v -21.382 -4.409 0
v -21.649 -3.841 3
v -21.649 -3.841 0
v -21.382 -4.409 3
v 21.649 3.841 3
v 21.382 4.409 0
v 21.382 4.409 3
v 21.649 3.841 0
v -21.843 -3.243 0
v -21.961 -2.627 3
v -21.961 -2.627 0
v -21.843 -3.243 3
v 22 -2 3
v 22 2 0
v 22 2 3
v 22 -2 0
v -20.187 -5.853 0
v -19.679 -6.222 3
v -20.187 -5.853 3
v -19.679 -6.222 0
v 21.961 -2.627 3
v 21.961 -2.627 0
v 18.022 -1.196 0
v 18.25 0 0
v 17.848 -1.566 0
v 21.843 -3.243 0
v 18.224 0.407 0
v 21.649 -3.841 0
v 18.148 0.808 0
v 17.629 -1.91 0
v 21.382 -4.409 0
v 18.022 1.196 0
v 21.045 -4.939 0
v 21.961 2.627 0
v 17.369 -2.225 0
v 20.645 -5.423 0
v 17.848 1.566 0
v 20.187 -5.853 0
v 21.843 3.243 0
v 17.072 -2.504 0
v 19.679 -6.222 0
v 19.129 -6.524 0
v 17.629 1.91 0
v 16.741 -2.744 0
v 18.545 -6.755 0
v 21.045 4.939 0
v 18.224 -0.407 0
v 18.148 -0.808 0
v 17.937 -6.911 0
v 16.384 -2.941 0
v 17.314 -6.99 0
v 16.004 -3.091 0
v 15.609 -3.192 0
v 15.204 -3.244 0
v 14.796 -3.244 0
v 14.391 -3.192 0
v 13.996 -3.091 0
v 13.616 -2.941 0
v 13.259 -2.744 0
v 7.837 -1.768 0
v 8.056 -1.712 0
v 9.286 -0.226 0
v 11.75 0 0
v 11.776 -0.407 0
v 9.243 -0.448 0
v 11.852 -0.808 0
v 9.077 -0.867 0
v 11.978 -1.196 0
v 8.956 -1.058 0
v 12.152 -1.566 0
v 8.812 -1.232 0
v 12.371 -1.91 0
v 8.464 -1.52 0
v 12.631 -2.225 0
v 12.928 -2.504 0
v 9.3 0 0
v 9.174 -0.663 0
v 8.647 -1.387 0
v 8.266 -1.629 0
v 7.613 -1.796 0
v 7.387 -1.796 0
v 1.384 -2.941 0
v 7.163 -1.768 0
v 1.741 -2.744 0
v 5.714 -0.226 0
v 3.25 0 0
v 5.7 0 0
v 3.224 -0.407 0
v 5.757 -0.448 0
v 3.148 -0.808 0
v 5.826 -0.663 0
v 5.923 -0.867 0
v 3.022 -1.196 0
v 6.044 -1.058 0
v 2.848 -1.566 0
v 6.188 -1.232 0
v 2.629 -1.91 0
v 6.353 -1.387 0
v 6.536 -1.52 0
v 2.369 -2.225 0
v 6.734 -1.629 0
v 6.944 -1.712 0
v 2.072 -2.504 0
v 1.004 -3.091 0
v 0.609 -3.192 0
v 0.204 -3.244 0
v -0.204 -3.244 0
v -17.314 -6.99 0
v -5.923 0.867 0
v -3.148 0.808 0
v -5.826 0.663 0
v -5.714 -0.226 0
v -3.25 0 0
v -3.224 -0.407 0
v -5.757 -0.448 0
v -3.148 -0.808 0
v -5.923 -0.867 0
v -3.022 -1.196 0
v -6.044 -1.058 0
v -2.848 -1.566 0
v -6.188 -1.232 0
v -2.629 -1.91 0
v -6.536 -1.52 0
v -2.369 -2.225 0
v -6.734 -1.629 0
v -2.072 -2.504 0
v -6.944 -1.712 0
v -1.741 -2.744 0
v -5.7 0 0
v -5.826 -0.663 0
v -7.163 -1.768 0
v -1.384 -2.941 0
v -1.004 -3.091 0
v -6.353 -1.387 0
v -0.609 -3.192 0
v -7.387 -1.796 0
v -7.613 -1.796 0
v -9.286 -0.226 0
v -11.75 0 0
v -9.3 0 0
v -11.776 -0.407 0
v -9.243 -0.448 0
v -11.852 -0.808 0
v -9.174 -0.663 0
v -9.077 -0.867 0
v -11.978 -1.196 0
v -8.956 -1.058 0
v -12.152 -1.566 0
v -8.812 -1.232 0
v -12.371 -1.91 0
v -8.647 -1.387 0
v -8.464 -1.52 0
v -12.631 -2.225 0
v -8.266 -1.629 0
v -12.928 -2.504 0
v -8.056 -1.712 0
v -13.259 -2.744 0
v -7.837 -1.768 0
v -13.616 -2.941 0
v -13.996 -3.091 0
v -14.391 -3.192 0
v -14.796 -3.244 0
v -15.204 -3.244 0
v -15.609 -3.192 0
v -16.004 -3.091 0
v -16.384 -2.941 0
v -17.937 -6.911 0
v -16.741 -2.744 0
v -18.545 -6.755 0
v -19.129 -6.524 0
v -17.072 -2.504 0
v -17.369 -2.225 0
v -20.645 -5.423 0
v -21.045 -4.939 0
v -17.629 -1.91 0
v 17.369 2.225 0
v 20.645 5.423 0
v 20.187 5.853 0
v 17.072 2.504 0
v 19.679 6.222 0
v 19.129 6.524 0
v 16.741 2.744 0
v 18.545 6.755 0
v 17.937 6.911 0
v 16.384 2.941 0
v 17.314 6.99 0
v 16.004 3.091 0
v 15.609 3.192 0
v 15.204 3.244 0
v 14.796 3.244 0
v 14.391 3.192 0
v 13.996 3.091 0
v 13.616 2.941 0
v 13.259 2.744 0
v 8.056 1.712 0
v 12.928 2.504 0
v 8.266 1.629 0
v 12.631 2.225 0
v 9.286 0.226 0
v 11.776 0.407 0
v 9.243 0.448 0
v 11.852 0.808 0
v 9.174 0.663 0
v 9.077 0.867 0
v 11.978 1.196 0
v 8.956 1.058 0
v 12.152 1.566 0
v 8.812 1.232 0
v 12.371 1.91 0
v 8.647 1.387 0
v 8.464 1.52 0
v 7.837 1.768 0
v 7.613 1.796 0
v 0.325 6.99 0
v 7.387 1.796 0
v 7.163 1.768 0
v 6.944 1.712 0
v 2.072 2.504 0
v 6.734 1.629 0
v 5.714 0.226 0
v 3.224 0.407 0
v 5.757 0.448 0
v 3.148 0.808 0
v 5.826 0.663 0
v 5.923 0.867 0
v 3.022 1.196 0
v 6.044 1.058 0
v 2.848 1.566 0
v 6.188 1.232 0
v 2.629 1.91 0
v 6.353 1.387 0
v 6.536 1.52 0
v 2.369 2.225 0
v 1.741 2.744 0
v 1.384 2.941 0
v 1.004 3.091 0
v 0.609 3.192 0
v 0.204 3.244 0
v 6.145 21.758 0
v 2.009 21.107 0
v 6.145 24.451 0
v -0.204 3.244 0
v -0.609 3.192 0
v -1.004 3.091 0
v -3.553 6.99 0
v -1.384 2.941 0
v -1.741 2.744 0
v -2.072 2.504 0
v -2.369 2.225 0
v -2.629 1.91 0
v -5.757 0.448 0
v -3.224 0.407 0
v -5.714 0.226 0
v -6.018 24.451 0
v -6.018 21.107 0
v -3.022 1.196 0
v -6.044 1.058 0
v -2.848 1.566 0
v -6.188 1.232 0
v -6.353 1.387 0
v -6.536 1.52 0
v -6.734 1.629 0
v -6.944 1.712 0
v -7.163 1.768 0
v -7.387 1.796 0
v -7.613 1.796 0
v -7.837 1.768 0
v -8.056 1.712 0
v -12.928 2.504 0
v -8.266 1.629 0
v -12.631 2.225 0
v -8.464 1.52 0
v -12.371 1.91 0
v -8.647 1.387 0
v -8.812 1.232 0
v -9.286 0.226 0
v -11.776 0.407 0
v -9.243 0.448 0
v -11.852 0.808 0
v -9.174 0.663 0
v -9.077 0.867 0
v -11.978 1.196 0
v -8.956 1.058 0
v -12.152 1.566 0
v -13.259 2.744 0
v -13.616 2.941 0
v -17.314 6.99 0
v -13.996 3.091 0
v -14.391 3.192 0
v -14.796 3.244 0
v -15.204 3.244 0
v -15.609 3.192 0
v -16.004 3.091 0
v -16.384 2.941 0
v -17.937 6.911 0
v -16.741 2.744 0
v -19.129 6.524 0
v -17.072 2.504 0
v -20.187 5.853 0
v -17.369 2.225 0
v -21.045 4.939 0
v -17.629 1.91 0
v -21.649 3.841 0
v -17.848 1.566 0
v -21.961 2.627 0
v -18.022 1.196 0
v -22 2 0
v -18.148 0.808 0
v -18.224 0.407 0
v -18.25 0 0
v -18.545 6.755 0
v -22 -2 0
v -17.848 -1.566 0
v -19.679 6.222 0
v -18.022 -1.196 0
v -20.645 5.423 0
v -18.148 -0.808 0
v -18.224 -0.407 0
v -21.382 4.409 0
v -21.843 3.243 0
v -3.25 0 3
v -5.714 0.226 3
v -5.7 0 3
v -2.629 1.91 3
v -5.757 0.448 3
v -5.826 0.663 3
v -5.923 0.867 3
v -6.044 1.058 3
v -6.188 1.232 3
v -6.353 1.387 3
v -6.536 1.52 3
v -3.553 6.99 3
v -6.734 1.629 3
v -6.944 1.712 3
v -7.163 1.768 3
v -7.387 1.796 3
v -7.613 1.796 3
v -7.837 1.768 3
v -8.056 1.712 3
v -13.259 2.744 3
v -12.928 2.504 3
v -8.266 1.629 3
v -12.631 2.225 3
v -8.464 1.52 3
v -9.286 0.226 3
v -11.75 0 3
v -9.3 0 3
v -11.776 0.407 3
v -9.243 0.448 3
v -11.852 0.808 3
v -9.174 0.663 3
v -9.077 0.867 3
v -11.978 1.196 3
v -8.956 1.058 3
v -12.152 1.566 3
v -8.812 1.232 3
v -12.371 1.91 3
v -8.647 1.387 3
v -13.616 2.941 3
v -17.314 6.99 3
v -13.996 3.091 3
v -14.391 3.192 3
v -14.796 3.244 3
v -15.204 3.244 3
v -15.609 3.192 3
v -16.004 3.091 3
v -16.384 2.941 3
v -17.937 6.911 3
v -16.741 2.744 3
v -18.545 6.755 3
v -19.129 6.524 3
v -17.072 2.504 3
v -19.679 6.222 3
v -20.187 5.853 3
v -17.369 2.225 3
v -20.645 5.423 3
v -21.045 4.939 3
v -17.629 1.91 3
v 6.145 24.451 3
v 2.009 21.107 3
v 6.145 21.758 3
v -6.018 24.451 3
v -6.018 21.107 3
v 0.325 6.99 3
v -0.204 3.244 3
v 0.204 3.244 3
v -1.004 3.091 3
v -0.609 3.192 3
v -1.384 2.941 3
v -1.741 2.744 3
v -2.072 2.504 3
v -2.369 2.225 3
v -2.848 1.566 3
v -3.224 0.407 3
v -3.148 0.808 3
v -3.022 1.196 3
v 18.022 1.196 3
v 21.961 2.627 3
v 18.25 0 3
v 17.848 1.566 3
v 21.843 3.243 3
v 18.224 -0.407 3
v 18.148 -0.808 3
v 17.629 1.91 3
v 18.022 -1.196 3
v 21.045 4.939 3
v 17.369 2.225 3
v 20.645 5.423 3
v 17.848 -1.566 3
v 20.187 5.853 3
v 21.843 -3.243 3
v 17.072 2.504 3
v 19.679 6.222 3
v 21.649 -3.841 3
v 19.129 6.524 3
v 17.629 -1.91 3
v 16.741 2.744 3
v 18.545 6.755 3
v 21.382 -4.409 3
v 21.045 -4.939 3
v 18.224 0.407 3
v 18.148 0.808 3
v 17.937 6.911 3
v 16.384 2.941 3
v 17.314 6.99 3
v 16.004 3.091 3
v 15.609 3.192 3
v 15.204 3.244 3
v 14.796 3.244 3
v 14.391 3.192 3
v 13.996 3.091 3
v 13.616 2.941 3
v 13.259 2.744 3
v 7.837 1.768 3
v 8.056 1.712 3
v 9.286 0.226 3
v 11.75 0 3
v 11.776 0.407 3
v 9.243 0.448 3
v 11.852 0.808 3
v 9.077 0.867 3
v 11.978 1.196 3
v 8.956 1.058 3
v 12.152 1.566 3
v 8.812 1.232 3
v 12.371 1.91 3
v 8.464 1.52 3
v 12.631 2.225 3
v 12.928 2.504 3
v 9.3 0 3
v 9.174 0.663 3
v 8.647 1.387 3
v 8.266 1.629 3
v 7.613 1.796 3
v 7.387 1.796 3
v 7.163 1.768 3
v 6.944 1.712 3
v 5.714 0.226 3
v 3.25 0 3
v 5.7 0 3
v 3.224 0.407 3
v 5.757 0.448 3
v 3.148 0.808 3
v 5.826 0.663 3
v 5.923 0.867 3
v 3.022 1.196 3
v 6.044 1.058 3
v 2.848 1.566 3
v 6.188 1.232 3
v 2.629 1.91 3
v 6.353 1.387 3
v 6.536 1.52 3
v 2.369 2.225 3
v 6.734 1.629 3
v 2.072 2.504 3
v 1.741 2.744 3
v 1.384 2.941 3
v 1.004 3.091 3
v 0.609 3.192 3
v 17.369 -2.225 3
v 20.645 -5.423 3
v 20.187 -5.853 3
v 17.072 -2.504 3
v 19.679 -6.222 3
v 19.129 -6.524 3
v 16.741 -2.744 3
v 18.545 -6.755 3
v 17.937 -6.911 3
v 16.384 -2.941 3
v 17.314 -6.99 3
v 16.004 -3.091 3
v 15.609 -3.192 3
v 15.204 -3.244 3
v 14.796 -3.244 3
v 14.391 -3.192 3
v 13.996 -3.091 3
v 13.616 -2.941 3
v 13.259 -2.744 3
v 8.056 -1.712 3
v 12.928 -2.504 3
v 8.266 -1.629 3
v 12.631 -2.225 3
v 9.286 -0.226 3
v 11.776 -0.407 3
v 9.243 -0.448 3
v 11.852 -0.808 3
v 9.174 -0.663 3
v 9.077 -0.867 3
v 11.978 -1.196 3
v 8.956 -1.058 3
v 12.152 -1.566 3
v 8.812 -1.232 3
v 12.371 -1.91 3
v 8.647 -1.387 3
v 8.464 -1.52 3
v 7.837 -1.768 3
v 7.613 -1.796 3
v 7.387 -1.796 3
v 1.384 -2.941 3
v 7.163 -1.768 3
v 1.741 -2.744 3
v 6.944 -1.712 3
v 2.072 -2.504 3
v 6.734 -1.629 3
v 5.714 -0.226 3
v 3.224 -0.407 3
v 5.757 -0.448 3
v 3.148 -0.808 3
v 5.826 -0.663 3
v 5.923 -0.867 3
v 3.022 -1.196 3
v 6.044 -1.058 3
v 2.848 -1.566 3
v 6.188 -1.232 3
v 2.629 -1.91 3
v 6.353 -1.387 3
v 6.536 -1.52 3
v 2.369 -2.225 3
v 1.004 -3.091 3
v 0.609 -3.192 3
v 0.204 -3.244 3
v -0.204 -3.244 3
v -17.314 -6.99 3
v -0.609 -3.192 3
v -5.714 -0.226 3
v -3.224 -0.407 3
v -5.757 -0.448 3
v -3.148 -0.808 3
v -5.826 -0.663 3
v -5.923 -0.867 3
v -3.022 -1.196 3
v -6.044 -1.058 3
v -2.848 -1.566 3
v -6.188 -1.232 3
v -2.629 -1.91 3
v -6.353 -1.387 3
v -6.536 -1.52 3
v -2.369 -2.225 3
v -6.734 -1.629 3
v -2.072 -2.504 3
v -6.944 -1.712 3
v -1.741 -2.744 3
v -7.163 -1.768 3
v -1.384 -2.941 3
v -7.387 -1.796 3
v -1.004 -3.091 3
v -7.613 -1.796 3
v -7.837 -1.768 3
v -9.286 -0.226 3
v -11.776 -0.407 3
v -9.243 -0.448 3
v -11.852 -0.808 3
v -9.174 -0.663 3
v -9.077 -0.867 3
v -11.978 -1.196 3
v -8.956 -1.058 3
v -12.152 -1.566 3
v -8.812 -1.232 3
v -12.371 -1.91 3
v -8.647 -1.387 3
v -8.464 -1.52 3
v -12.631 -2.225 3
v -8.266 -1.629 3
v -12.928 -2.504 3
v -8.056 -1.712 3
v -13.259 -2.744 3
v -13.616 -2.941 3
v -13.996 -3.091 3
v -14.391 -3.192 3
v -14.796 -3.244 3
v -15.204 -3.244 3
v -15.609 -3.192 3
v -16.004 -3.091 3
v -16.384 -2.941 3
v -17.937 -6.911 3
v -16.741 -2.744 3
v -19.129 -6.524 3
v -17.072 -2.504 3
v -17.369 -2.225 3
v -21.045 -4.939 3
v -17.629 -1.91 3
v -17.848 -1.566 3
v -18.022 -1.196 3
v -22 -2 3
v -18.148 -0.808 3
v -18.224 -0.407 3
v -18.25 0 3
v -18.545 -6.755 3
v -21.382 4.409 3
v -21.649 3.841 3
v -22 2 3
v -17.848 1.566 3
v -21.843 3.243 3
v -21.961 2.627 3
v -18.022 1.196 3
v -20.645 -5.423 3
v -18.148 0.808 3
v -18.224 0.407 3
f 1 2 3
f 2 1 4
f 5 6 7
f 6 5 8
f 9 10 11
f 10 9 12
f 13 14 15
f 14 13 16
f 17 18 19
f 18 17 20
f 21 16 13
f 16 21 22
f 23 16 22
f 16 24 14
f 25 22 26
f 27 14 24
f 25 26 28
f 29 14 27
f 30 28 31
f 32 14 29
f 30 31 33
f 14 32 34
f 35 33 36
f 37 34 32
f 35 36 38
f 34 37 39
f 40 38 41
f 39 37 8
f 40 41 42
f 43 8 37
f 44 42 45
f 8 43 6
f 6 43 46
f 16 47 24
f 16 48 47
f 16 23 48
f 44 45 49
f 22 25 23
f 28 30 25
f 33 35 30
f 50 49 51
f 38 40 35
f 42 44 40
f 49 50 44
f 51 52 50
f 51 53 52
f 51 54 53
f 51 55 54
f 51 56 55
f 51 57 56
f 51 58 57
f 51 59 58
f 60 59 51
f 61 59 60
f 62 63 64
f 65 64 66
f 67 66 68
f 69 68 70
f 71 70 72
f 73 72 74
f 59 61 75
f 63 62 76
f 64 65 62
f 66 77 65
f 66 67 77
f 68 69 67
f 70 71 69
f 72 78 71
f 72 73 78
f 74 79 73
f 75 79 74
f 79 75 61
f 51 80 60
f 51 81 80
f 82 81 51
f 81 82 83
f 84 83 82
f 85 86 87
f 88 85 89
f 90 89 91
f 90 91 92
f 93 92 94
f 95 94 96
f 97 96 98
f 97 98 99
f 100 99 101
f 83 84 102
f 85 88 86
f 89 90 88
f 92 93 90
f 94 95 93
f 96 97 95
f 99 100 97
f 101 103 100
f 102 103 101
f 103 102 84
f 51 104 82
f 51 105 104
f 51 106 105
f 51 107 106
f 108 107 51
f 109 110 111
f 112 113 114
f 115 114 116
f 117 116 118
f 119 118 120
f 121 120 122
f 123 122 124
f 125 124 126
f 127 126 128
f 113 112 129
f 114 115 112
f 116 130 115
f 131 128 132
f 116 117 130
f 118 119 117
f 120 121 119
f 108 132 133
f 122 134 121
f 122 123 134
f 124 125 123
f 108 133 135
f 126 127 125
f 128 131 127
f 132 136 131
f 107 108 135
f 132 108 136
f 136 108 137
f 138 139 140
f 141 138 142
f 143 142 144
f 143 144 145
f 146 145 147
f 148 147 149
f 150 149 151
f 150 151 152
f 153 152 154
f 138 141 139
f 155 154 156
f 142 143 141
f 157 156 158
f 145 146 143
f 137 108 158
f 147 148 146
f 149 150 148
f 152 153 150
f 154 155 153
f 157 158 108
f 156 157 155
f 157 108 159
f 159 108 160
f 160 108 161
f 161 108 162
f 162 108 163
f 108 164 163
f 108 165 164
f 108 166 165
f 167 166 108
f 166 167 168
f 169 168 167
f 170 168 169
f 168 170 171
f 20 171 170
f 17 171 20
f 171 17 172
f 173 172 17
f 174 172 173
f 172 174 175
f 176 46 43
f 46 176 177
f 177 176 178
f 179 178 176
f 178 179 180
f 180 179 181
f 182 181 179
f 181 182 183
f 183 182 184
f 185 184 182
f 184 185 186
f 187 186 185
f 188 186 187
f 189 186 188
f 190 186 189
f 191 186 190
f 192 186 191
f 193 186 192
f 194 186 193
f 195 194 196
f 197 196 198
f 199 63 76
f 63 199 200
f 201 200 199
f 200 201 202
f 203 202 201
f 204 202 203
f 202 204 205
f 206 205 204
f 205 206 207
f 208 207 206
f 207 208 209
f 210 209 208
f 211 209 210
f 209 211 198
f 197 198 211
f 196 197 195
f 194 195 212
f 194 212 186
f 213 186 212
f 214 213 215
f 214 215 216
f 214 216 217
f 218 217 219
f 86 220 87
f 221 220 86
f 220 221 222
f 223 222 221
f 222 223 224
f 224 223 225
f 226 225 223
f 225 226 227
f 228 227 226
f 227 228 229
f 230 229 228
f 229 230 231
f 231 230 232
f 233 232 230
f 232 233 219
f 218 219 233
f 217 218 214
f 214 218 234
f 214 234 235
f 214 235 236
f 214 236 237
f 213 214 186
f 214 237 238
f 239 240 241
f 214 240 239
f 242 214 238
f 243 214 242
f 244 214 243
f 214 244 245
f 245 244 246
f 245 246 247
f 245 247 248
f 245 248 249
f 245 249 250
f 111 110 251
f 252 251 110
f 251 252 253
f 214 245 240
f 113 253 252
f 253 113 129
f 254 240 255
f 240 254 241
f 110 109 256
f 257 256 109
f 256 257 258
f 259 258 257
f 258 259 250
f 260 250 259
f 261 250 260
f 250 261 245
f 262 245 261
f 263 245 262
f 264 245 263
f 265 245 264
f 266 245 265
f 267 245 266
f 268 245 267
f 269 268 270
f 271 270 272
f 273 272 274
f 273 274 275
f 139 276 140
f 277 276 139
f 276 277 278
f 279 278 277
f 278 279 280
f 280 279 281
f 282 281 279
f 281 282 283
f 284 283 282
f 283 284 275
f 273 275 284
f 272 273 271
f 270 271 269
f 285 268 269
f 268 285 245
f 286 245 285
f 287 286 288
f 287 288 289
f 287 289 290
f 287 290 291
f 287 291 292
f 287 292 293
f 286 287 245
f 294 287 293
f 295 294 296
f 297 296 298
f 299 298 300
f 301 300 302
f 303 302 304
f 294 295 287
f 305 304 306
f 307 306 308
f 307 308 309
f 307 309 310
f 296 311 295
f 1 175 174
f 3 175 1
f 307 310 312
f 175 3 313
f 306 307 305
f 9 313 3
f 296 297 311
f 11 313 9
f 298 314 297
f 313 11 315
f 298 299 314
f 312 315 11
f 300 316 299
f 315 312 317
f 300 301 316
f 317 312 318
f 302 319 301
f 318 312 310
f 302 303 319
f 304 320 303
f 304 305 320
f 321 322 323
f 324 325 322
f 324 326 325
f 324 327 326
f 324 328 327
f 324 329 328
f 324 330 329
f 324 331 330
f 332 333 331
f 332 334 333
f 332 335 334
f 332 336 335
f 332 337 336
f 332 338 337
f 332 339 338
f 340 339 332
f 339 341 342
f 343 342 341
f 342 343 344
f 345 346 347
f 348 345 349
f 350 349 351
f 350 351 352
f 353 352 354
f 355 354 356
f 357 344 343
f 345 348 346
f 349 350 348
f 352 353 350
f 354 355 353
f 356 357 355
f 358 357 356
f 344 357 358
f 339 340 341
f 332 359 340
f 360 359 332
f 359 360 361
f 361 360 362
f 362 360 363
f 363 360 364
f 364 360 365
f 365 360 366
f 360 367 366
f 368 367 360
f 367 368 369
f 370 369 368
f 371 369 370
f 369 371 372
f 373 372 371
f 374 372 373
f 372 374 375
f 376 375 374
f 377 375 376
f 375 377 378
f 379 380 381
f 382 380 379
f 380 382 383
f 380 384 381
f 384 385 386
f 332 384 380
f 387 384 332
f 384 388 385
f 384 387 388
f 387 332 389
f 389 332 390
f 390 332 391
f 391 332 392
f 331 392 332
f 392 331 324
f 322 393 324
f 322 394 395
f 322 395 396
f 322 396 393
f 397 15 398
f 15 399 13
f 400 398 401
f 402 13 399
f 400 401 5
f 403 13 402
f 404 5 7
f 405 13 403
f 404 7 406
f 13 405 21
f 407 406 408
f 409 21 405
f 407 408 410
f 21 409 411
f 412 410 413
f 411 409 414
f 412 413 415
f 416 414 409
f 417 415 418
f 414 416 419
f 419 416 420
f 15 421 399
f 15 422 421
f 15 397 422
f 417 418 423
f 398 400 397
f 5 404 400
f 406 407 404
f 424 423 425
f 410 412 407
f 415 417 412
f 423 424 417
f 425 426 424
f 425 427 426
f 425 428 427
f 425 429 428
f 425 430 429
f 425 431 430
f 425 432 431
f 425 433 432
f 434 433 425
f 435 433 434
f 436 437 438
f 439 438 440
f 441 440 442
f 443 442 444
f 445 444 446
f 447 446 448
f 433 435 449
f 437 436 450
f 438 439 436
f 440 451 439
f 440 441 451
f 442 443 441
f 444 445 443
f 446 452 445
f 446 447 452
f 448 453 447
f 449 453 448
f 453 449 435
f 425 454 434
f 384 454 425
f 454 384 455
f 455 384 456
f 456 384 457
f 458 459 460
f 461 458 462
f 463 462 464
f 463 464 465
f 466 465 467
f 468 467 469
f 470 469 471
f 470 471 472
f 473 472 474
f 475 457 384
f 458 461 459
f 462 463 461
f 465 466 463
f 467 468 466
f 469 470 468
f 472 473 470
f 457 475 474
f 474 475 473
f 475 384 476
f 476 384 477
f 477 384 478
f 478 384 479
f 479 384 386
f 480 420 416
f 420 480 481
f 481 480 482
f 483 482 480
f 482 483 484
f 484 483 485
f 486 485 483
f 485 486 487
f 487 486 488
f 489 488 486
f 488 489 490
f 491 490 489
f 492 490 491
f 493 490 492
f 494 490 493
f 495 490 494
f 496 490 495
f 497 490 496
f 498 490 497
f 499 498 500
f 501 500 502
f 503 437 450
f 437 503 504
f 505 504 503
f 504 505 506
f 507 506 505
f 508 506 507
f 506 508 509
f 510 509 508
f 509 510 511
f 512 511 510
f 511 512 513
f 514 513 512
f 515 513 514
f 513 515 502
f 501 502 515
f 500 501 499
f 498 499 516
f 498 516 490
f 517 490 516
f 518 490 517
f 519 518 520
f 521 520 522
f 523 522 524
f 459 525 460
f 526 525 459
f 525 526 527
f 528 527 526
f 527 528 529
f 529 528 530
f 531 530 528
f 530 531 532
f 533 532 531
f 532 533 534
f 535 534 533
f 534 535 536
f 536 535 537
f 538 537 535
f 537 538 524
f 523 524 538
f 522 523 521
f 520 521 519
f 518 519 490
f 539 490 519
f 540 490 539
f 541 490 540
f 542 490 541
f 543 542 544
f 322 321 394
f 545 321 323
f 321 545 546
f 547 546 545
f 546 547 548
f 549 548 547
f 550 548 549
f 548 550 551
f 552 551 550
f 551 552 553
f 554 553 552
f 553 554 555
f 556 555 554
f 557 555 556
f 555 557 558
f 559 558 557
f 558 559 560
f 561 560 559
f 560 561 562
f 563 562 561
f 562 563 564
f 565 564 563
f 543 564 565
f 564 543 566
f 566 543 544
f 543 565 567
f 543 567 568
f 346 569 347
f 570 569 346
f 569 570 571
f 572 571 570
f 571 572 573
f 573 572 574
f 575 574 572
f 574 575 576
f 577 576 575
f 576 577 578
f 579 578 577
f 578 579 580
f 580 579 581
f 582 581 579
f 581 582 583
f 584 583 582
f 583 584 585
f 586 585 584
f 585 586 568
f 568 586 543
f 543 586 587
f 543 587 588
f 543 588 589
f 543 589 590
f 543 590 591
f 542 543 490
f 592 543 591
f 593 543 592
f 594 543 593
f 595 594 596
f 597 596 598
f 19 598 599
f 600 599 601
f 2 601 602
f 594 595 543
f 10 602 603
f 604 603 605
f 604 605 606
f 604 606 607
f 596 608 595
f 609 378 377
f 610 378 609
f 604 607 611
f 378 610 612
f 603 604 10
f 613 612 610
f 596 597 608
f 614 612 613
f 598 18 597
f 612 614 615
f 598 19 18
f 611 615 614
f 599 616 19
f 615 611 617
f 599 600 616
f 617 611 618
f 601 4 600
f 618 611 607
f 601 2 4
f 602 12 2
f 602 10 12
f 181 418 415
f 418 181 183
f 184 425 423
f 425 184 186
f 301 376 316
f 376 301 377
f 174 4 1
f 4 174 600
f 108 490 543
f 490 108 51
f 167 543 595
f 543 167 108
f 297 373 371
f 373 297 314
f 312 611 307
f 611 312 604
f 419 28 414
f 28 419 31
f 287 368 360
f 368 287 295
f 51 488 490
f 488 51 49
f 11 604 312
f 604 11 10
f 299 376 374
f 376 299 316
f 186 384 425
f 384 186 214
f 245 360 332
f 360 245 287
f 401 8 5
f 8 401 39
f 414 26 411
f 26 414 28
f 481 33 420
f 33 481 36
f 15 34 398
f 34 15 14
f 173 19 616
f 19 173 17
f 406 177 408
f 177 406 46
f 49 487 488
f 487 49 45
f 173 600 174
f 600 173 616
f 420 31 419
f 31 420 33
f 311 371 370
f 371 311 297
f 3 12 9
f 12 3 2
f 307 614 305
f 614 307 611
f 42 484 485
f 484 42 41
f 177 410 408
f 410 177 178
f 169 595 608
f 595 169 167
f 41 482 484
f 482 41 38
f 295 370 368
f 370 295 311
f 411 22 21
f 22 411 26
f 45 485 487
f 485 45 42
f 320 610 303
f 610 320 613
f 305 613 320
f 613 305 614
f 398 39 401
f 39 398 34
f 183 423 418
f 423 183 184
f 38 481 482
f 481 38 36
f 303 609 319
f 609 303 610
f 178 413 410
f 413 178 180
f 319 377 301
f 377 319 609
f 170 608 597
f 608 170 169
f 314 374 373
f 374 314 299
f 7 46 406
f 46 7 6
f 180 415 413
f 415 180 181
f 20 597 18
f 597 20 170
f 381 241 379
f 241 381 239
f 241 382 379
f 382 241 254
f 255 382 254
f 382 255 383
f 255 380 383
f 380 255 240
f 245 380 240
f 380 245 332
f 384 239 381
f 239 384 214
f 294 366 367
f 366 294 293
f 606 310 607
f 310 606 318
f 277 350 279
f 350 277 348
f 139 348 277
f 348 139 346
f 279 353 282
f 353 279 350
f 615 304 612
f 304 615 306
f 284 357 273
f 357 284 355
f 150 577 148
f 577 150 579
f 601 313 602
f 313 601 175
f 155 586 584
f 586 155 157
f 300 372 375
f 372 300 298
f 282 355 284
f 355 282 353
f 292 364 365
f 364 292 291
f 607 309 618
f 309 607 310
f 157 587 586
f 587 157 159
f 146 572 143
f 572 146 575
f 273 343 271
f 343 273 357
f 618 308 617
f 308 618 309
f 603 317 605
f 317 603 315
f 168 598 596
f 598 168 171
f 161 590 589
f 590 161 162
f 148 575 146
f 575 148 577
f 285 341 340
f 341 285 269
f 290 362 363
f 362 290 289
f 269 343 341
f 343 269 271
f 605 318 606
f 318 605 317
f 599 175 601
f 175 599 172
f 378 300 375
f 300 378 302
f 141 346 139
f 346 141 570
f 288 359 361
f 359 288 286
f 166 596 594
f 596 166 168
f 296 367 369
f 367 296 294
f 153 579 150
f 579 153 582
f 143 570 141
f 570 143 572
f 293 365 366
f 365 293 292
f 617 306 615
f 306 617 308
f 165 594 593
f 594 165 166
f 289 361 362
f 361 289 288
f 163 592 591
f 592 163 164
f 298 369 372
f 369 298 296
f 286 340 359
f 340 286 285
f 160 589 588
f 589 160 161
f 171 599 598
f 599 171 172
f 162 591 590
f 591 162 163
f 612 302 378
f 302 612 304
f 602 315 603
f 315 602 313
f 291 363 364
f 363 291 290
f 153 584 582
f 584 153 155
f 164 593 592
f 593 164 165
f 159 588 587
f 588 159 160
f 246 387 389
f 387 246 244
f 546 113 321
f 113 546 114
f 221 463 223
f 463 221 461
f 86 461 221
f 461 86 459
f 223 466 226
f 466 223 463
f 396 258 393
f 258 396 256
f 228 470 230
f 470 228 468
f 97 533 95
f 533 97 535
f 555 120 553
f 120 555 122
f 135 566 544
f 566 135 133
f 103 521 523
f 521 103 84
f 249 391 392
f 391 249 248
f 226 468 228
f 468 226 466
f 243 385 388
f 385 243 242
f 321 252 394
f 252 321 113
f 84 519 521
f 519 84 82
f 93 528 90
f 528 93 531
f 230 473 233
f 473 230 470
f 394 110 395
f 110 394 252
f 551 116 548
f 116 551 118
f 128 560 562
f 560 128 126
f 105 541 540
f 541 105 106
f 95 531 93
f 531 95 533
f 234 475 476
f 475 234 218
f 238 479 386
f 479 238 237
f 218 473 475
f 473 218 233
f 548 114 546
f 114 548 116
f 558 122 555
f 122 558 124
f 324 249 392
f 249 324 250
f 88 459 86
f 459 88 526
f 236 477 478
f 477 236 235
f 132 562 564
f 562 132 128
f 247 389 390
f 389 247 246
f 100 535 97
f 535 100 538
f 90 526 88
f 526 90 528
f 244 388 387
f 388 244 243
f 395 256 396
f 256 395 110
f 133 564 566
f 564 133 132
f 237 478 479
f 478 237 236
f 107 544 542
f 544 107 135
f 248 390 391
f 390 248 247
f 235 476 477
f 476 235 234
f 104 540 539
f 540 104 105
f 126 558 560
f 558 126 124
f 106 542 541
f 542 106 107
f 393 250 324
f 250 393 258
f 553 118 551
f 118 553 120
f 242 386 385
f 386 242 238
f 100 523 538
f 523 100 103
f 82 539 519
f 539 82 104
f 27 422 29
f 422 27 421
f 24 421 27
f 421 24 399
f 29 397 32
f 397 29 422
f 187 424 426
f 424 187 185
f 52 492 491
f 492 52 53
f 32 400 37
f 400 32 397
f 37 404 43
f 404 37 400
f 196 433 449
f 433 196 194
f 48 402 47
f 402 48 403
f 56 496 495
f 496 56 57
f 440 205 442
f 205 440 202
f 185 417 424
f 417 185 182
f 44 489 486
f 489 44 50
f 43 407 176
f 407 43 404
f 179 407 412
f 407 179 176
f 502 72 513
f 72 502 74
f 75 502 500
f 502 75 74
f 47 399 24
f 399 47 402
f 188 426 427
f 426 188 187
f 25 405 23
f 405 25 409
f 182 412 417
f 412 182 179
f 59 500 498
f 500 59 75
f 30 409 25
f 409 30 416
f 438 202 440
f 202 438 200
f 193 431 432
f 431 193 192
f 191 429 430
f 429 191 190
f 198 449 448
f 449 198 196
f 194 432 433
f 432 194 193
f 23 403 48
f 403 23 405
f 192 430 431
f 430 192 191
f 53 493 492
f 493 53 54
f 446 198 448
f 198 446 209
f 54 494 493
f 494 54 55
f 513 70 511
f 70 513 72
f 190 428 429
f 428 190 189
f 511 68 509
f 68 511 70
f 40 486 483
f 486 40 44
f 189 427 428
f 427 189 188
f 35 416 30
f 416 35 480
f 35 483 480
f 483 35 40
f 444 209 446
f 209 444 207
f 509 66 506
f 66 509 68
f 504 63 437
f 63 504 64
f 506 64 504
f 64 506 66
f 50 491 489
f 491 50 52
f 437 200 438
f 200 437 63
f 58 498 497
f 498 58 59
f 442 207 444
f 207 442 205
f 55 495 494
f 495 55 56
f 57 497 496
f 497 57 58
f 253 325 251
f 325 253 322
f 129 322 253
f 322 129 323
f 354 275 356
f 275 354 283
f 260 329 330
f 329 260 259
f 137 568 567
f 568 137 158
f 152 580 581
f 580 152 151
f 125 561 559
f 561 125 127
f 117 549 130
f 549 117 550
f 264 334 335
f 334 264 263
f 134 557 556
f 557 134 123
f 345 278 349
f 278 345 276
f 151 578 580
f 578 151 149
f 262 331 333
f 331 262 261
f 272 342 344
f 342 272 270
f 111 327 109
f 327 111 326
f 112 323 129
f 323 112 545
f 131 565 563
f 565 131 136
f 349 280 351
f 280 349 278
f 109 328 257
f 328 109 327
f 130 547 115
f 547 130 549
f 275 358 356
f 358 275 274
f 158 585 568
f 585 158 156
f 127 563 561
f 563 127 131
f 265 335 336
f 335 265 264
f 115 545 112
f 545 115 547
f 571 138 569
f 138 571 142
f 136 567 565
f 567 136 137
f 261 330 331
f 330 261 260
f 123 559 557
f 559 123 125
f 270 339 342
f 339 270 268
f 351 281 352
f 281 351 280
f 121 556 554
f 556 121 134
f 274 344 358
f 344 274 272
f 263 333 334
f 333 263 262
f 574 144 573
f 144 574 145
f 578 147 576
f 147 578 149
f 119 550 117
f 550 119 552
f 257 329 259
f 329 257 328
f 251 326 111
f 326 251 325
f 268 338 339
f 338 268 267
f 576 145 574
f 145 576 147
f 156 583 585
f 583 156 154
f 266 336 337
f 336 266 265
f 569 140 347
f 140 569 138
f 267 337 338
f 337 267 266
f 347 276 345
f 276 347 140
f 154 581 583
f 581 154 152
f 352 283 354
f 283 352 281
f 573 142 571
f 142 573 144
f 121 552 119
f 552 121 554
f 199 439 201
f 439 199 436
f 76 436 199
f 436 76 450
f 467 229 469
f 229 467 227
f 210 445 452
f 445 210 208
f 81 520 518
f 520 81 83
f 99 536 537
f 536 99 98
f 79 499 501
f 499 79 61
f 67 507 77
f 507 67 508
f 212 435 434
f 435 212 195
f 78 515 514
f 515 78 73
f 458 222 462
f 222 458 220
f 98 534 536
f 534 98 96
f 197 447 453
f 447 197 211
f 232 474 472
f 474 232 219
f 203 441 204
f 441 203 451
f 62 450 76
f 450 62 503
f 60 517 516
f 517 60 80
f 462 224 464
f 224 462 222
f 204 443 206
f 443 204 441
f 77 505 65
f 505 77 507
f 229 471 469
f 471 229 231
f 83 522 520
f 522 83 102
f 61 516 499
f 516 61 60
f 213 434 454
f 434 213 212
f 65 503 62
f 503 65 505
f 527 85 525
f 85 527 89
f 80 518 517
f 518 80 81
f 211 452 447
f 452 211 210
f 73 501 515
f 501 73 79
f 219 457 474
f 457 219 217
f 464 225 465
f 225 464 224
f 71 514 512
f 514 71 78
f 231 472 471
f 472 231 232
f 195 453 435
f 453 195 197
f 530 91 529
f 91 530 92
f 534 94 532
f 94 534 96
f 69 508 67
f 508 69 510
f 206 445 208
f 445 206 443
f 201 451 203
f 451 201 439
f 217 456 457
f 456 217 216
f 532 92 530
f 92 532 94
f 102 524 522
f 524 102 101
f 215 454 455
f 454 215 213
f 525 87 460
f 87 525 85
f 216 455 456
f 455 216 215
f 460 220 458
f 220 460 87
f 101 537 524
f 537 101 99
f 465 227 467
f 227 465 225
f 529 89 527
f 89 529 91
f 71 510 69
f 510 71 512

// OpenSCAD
$fn = 50;


difference() {
	union() {
		hull() {
			translate(v = [-17.0000000000, 2.0000000000, 0]) {
				cylinder(h = 3, r = 5);
			}
			translate(v = [17.0000000000, 2.0000000000, 0]) {
				cylinder(h = 3, r = 5);
			}
			translate(v = [-17.0000000000, -2.0000000000, 0]) {
				cylinder(h = 3, r = 5);
			}
			translate(v = [17.0000000000, -2.0000000000, 0]) {
				cylinder(h = 3, r = 5);
			}
		}
		translate(v = [0, 24, 0]) {
			linear_extrude(height = 3) {
				text(font = "DejaVu Sans Mono:style=Bold", halign = "center", size = 19.0000000000, text = "7", valign = "top");
			}
		}
	}
	union() {
		translate(v = [-15.0000000000, 0.0000000000, 0]) {
			translate(v = [0, 0, -100]) {
				cylinder(h = 200, r = 3.2500000000);
			}
		}
		translate(v = [0, 0, -100]) {
			cylinder(h = 200, r = 3.2500000000);
		}
		translate(v = [15.0000000000, 0.0000000000, 0]) {
			translate(v = [0, 0, -100]) {
				cylinder(h = 200, r = 3.2500000000);
			}
		}
		translate(v = [-15.0000000000, 0.0000000000, 0]) {
			translate(v = [0, 0, -100]) {
				cylinder(h = 200, r = 1.8000000000);
			}
		}
		translate(v = [-7.5000000000, 0.0000000000, 0]) {
			translate(v = [0, 0, -100]) {
				cylinder(h = 200, r = 1.8000000000);
			}
		}
		translate(v = [0, 0, -100]) {
			cylinder(h = 200, r = 1.8000000000);
		}
		translate(v = [7.5000000000, 0.0000000000, 0]) {
			translate(v = [0, 0, -100]) {
				cylinder(h = 200, r = 1.8000000000);
			}
		}
		translate(v = [15.0000000000, 0.0000000000, 0]) {
			translate(v = [0, 0, -100]) {
				cylinder(h = 200, r = 1.8000000000);
			}
		}
	}
}
